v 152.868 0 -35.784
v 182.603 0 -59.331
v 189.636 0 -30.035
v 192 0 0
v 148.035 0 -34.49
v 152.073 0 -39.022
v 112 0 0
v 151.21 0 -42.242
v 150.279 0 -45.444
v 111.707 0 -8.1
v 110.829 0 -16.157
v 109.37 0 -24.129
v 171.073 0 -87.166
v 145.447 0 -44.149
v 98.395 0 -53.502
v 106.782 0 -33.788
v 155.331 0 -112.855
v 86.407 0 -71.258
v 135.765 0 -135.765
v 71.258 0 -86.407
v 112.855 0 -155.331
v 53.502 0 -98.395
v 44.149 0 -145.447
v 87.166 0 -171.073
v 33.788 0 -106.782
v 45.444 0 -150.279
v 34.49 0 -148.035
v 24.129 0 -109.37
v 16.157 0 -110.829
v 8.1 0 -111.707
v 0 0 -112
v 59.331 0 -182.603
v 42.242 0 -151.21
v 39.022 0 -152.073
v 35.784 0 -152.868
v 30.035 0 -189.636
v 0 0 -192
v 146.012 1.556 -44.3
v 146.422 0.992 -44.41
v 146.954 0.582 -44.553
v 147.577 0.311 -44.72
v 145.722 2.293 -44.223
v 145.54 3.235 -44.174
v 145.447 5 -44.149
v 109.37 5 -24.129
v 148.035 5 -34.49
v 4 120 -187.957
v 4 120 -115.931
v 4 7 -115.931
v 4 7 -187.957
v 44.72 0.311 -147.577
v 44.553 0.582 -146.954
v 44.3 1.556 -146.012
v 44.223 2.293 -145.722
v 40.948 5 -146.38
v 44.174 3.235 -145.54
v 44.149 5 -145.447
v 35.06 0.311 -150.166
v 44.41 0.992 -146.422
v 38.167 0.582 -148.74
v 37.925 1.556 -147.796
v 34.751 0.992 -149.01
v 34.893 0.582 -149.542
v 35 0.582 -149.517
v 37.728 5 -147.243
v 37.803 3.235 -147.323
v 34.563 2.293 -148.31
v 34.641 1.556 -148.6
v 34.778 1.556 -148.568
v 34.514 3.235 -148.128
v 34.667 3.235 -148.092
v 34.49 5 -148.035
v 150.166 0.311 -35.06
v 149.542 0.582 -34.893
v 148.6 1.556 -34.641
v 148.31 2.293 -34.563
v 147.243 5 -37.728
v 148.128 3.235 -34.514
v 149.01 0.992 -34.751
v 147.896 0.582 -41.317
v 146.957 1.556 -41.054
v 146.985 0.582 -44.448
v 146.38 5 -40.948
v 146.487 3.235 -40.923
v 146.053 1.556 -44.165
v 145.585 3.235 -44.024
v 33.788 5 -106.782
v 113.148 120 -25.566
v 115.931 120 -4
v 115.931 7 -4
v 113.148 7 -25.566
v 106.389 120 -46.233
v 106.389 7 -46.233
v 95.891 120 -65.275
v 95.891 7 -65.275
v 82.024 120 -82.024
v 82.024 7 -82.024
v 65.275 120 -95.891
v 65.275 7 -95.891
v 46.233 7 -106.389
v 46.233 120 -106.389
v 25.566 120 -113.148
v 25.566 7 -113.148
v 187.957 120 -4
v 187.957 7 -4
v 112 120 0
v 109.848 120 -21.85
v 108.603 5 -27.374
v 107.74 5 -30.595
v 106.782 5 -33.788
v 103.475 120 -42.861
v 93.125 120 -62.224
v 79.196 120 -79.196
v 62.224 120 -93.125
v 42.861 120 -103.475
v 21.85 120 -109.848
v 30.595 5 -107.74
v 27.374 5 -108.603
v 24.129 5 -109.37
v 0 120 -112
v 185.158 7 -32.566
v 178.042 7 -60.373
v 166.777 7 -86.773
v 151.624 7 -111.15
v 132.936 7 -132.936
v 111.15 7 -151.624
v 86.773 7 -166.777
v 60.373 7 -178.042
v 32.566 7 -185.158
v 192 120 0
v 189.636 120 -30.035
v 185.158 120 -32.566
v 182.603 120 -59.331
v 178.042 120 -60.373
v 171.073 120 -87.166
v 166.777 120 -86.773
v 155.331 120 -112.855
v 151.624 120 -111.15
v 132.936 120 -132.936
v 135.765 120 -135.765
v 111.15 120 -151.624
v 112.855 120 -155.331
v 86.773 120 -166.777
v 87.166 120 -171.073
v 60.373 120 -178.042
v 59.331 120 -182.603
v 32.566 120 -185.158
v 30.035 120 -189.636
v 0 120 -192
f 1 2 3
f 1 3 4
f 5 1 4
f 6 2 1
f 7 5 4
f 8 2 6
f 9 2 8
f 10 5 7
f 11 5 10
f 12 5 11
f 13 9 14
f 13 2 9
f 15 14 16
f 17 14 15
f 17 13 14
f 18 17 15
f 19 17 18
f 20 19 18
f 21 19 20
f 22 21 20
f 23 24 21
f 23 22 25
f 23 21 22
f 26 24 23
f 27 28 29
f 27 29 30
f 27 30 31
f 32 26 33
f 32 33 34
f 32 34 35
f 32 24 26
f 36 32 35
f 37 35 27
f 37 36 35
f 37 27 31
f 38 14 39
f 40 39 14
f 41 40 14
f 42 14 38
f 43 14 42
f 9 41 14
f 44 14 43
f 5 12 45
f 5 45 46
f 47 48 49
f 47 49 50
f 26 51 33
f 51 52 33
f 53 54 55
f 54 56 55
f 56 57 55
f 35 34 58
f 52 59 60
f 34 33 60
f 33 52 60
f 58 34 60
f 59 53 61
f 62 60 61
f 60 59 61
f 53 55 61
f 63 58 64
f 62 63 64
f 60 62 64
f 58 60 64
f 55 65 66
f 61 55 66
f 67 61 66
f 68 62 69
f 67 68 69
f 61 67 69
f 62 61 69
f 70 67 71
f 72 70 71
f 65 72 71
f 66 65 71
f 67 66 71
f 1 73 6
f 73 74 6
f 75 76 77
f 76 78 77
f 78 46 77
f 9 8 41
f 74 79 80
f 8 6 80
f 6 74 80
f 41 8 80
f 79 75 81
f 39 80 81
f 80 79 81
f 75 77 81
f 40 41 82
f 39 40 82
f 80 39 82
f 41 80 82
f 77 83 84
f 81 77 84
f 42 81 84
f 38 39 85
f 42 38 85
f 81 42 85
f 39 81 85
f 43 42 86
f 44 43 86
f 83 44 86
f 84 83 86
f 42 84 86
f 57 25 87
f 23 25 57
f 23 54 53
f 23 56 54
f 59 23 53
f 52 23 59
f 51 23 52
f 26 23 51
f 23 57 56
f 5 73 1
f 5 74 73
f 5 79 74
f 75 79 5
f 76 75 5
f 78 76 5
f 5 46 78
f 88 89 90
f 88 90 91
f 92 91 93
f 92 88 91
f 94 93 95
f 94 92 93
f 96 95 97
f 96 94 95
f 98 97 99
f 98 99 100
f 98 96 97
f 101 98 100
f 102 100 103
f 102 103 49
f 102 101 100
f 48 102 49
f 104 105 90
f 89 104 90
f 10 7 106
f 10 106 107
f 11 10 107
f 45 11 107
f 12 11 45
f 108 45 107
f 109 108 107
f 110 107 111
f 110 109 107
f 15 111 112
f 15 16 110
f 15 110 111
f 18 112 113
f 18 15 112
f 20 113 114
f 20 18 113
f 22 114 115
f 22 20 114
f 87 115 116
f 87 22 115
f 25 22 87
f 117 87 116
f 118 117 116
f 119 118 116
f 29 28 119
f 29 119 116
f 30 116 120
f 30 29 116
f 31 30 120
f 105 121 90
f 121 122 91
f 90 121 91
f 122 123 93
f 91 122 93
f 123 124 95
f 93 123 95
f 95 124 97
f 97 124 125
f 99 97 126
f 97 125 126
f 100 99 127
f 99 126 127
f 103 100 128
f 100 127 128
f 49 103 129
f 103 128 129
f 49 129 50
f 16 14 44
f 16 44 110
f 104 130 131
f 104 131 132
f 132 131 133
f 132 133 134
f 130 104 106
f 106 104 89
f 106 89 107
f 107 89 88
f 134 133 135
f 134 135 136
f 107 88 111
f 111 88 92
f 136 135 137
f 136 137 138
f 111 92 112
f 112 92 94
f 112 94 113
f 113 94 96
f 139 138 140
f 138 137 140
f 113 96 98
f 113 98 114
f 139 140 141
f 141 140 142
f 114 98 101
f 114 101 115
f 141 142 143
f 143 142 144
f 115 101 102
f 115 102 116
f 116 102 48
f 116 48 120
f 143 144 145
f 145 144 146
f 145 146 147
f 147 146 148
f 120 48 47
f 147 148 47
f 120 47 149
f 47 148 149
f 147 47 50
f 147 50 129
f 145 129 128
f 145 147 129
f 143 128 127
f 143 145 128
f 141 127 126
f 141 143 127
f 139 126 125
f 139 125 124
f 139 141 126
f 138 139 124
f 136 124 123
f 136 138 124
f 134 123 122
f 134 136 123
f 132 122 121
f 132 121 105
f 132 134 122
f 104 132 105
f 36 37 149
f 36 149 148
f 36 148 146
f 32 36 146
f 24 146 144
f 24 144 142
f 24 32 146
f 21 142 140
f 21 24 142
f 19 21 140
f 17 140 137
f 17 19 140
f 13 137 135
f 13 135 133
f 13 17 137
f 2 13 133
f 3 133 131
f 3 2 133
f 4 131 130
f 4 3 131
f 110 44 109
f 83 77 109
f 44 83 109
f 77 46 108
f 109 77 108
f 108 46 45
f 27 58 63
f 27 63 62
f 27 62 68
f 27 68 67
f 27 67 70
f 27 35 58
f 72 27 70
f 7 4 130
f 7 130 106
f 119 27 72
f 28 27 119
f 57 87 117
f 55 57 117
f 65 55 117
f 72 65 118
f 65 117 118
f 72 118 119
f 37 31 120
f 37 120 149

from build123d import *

# Parameters (mm, degrees)
ESTRUSIONE_ESTRUSIONE1_DEPTH = 120
TAGLIO_ESTRUSIONE1_DEPTH     = 113
TAGLIO_ESTRUSIONE2_DEPTH     = 5
RACCORDO1_SIZE               = 5


with BuildPart() as part:
    # Schizzo1 → Estrusione-Estrusione1 (new body)
    with BuildSketch(Plane(origin=(0, 0, 0), x_dir=(1, 0, 0), z_dir=(0, 1, 0))):
        with BuildLine():
            Line((0, 112), (0, 192))
            ThreePointArc((0, 192), (135.764501988, 135.764501988), (192, 0))
            Line((192, 0), (112, 0))
            ThreePointArc((112, 0), (79.195959493, 79.195959493), (0, 112))
        make_face()
    extrude(amount=ESTRUSIONE_ESTRUSIONE1_DEPTH)

    # Schizzo2 → Taglio-Estrusione1 (cut)
    with BuildSketch(Plane(origin=(0, 120, 0), x_dir=(1, 0, 0), z_dir=(0, 1, 0))):
        with BuildLine():
            Line((4, 115.93101397), (4, 187.957441992))
            ThreePointArc((4, 187.957441992), (132.936074863, 132.936074863), (187.957441992, 4))
            Line((187.957441992, 4), (115.93101397, 4))
            ThreePointArc((115.93101397, 4), (82.024386618, 82.024386618), (4, 115.93101397))
        make_face()
    extrude(amount=-TAGLIO_ESTRUSIONE1_DEPTH, mode=Mode.SUBTRACT)

    # Schizzo3 → Taglio-Estrusione2 (cut)
    with BuildSketch(Plane.XZ):
        with BuildLine():
            Line((34.489575502, -148.035364632), (24.129203459, -109.369929782))
            ThreePointArc((24.129203459, -109.369929782), (28.987733051, -108.183692544), (33.788461722, -106.781739331))
            Line((33.788461722, -106.781739331), (44.148833765, -145.447174181))
            ThreePointArc((44.148833765, -145.447174181), (39.340494856, -146.820725596), (34.489575502, -148.035364632))
        make_face()
        with BuildLine():
            Line((145.447174181, -44.148833765), (106.781739331, -33.788461722))
            ThreePointArc((106.781739331, -33.788461722), (108.183692544, -28.987733051), (109.369929782, -24.129203459))
            Line((109.369929782, -24.129203459), (148.035364632, -34.489575502))
            ThreePointArc((148.035364632, -34.489575502), (146.820725596, -39.340494856), (145.447174181, -44.148833765))
        make_face()
    extrude(amount=-TAGLIO_ESTRUSIONE2_DEPTH, mode=Mode.SUBTRACT)

    # Raccordo1
    # a fillet whose section is not a circle: 5 mm, written as the material it takes off along each edge
    with BuildSketch(Plane(origin=(0, 0, 0), x_dir=(0.9892644198784365, 0, -0.14613660582681076), z_dir=(0.14613660582681076, 0, 0.9892644198784365))) as raccordo1_piece_1_section:
        with BuildLine():
            Bezier((152 + RACCORDO1_SIZE, 0), (152, 0), (152, RACCORDO1_SIZE), weights=[1, 1.5, 1])
            Line((152, RACCORDO1_SIZE), (152, 0))
            Line((152, 0), (152 + RACCORDO1_SIZE, 0))
        make_face()
    raccordo1_piece_1 = revolve(axis=Axis((0, 0, 0), (0, 1, 0)), revolution_arc=13.193793896, mode=Mode.PRIVATE)
    raccordo1_piece_1 = split(raccordo1_piece_1, bisect_by=Plane(origin=(-1.294095226, 0, -4.829629131), z_dir=(0.2588190451025214, 0, 0.9659258262890682)), keep=Keep.TOP, mode=Mode.PRIVATE)
    raccordo1_piece_1 = split(raccordo1_piece_1, bisect_by=Plane(origin=(1.294095225, 0, 4.829629131), z_dir=(-0.25881904510252096, 0, -0.9659258262890682)), keep=Keep.TOP, mode=Mode.PRIVATE)
    add(raccordo1_piece_1, mode=Mode.SUBTRACT)
    with BuildSketch(Plane(origin=(0, 0, 0), x_dir=(0.36807419687030923, 0, -0.9297964215882295), z_dir=(0.9297964215882295, 0, 0.36807419687030923))) as raccordo1_piece_2_section:
        with BuildLine():
            Bezier((152 + RACCORDO1_SIZE, 0), (152, 0), (152, RACCORDO1_SIZE), weights=[1, 1.5, 1])
            Line((152, RACCORDO1_SIZE), (152, 0))
            Line((152, 0), (152 + RACCORDO1_SIZE, 0))
        make_face()
    raccordo1_piece_2 = revolve(axis=Axis((0, 0, 0), (0, 1, 0)), revolution_arc=13.193793896, mode=Mode.PRIVATE)
    raccordo1_piece_2 = split(raccordo1_piece_2, bisect_by=Plane(origin=(-4.829629131, 0, -1.294095225), z_dir=(0.965925826289068, 0, 0.2588190451025222)), keep=Keep.TOP, mode=Mode.PRIVATE)
    raccordo1_piece_2 = split(raccordo1_piece_2, bisect_by=Plane(origin=(4.829629131, 0, 1.294095226), z_dir=(-0.965925826289068, 0, -0.2588190451025218)), keep=Keep.TOP, mode=Mode.PRIVATE)
    add(raccordo1_piece_2, mode=Mode.SUBTRACT)


solid = part.part
